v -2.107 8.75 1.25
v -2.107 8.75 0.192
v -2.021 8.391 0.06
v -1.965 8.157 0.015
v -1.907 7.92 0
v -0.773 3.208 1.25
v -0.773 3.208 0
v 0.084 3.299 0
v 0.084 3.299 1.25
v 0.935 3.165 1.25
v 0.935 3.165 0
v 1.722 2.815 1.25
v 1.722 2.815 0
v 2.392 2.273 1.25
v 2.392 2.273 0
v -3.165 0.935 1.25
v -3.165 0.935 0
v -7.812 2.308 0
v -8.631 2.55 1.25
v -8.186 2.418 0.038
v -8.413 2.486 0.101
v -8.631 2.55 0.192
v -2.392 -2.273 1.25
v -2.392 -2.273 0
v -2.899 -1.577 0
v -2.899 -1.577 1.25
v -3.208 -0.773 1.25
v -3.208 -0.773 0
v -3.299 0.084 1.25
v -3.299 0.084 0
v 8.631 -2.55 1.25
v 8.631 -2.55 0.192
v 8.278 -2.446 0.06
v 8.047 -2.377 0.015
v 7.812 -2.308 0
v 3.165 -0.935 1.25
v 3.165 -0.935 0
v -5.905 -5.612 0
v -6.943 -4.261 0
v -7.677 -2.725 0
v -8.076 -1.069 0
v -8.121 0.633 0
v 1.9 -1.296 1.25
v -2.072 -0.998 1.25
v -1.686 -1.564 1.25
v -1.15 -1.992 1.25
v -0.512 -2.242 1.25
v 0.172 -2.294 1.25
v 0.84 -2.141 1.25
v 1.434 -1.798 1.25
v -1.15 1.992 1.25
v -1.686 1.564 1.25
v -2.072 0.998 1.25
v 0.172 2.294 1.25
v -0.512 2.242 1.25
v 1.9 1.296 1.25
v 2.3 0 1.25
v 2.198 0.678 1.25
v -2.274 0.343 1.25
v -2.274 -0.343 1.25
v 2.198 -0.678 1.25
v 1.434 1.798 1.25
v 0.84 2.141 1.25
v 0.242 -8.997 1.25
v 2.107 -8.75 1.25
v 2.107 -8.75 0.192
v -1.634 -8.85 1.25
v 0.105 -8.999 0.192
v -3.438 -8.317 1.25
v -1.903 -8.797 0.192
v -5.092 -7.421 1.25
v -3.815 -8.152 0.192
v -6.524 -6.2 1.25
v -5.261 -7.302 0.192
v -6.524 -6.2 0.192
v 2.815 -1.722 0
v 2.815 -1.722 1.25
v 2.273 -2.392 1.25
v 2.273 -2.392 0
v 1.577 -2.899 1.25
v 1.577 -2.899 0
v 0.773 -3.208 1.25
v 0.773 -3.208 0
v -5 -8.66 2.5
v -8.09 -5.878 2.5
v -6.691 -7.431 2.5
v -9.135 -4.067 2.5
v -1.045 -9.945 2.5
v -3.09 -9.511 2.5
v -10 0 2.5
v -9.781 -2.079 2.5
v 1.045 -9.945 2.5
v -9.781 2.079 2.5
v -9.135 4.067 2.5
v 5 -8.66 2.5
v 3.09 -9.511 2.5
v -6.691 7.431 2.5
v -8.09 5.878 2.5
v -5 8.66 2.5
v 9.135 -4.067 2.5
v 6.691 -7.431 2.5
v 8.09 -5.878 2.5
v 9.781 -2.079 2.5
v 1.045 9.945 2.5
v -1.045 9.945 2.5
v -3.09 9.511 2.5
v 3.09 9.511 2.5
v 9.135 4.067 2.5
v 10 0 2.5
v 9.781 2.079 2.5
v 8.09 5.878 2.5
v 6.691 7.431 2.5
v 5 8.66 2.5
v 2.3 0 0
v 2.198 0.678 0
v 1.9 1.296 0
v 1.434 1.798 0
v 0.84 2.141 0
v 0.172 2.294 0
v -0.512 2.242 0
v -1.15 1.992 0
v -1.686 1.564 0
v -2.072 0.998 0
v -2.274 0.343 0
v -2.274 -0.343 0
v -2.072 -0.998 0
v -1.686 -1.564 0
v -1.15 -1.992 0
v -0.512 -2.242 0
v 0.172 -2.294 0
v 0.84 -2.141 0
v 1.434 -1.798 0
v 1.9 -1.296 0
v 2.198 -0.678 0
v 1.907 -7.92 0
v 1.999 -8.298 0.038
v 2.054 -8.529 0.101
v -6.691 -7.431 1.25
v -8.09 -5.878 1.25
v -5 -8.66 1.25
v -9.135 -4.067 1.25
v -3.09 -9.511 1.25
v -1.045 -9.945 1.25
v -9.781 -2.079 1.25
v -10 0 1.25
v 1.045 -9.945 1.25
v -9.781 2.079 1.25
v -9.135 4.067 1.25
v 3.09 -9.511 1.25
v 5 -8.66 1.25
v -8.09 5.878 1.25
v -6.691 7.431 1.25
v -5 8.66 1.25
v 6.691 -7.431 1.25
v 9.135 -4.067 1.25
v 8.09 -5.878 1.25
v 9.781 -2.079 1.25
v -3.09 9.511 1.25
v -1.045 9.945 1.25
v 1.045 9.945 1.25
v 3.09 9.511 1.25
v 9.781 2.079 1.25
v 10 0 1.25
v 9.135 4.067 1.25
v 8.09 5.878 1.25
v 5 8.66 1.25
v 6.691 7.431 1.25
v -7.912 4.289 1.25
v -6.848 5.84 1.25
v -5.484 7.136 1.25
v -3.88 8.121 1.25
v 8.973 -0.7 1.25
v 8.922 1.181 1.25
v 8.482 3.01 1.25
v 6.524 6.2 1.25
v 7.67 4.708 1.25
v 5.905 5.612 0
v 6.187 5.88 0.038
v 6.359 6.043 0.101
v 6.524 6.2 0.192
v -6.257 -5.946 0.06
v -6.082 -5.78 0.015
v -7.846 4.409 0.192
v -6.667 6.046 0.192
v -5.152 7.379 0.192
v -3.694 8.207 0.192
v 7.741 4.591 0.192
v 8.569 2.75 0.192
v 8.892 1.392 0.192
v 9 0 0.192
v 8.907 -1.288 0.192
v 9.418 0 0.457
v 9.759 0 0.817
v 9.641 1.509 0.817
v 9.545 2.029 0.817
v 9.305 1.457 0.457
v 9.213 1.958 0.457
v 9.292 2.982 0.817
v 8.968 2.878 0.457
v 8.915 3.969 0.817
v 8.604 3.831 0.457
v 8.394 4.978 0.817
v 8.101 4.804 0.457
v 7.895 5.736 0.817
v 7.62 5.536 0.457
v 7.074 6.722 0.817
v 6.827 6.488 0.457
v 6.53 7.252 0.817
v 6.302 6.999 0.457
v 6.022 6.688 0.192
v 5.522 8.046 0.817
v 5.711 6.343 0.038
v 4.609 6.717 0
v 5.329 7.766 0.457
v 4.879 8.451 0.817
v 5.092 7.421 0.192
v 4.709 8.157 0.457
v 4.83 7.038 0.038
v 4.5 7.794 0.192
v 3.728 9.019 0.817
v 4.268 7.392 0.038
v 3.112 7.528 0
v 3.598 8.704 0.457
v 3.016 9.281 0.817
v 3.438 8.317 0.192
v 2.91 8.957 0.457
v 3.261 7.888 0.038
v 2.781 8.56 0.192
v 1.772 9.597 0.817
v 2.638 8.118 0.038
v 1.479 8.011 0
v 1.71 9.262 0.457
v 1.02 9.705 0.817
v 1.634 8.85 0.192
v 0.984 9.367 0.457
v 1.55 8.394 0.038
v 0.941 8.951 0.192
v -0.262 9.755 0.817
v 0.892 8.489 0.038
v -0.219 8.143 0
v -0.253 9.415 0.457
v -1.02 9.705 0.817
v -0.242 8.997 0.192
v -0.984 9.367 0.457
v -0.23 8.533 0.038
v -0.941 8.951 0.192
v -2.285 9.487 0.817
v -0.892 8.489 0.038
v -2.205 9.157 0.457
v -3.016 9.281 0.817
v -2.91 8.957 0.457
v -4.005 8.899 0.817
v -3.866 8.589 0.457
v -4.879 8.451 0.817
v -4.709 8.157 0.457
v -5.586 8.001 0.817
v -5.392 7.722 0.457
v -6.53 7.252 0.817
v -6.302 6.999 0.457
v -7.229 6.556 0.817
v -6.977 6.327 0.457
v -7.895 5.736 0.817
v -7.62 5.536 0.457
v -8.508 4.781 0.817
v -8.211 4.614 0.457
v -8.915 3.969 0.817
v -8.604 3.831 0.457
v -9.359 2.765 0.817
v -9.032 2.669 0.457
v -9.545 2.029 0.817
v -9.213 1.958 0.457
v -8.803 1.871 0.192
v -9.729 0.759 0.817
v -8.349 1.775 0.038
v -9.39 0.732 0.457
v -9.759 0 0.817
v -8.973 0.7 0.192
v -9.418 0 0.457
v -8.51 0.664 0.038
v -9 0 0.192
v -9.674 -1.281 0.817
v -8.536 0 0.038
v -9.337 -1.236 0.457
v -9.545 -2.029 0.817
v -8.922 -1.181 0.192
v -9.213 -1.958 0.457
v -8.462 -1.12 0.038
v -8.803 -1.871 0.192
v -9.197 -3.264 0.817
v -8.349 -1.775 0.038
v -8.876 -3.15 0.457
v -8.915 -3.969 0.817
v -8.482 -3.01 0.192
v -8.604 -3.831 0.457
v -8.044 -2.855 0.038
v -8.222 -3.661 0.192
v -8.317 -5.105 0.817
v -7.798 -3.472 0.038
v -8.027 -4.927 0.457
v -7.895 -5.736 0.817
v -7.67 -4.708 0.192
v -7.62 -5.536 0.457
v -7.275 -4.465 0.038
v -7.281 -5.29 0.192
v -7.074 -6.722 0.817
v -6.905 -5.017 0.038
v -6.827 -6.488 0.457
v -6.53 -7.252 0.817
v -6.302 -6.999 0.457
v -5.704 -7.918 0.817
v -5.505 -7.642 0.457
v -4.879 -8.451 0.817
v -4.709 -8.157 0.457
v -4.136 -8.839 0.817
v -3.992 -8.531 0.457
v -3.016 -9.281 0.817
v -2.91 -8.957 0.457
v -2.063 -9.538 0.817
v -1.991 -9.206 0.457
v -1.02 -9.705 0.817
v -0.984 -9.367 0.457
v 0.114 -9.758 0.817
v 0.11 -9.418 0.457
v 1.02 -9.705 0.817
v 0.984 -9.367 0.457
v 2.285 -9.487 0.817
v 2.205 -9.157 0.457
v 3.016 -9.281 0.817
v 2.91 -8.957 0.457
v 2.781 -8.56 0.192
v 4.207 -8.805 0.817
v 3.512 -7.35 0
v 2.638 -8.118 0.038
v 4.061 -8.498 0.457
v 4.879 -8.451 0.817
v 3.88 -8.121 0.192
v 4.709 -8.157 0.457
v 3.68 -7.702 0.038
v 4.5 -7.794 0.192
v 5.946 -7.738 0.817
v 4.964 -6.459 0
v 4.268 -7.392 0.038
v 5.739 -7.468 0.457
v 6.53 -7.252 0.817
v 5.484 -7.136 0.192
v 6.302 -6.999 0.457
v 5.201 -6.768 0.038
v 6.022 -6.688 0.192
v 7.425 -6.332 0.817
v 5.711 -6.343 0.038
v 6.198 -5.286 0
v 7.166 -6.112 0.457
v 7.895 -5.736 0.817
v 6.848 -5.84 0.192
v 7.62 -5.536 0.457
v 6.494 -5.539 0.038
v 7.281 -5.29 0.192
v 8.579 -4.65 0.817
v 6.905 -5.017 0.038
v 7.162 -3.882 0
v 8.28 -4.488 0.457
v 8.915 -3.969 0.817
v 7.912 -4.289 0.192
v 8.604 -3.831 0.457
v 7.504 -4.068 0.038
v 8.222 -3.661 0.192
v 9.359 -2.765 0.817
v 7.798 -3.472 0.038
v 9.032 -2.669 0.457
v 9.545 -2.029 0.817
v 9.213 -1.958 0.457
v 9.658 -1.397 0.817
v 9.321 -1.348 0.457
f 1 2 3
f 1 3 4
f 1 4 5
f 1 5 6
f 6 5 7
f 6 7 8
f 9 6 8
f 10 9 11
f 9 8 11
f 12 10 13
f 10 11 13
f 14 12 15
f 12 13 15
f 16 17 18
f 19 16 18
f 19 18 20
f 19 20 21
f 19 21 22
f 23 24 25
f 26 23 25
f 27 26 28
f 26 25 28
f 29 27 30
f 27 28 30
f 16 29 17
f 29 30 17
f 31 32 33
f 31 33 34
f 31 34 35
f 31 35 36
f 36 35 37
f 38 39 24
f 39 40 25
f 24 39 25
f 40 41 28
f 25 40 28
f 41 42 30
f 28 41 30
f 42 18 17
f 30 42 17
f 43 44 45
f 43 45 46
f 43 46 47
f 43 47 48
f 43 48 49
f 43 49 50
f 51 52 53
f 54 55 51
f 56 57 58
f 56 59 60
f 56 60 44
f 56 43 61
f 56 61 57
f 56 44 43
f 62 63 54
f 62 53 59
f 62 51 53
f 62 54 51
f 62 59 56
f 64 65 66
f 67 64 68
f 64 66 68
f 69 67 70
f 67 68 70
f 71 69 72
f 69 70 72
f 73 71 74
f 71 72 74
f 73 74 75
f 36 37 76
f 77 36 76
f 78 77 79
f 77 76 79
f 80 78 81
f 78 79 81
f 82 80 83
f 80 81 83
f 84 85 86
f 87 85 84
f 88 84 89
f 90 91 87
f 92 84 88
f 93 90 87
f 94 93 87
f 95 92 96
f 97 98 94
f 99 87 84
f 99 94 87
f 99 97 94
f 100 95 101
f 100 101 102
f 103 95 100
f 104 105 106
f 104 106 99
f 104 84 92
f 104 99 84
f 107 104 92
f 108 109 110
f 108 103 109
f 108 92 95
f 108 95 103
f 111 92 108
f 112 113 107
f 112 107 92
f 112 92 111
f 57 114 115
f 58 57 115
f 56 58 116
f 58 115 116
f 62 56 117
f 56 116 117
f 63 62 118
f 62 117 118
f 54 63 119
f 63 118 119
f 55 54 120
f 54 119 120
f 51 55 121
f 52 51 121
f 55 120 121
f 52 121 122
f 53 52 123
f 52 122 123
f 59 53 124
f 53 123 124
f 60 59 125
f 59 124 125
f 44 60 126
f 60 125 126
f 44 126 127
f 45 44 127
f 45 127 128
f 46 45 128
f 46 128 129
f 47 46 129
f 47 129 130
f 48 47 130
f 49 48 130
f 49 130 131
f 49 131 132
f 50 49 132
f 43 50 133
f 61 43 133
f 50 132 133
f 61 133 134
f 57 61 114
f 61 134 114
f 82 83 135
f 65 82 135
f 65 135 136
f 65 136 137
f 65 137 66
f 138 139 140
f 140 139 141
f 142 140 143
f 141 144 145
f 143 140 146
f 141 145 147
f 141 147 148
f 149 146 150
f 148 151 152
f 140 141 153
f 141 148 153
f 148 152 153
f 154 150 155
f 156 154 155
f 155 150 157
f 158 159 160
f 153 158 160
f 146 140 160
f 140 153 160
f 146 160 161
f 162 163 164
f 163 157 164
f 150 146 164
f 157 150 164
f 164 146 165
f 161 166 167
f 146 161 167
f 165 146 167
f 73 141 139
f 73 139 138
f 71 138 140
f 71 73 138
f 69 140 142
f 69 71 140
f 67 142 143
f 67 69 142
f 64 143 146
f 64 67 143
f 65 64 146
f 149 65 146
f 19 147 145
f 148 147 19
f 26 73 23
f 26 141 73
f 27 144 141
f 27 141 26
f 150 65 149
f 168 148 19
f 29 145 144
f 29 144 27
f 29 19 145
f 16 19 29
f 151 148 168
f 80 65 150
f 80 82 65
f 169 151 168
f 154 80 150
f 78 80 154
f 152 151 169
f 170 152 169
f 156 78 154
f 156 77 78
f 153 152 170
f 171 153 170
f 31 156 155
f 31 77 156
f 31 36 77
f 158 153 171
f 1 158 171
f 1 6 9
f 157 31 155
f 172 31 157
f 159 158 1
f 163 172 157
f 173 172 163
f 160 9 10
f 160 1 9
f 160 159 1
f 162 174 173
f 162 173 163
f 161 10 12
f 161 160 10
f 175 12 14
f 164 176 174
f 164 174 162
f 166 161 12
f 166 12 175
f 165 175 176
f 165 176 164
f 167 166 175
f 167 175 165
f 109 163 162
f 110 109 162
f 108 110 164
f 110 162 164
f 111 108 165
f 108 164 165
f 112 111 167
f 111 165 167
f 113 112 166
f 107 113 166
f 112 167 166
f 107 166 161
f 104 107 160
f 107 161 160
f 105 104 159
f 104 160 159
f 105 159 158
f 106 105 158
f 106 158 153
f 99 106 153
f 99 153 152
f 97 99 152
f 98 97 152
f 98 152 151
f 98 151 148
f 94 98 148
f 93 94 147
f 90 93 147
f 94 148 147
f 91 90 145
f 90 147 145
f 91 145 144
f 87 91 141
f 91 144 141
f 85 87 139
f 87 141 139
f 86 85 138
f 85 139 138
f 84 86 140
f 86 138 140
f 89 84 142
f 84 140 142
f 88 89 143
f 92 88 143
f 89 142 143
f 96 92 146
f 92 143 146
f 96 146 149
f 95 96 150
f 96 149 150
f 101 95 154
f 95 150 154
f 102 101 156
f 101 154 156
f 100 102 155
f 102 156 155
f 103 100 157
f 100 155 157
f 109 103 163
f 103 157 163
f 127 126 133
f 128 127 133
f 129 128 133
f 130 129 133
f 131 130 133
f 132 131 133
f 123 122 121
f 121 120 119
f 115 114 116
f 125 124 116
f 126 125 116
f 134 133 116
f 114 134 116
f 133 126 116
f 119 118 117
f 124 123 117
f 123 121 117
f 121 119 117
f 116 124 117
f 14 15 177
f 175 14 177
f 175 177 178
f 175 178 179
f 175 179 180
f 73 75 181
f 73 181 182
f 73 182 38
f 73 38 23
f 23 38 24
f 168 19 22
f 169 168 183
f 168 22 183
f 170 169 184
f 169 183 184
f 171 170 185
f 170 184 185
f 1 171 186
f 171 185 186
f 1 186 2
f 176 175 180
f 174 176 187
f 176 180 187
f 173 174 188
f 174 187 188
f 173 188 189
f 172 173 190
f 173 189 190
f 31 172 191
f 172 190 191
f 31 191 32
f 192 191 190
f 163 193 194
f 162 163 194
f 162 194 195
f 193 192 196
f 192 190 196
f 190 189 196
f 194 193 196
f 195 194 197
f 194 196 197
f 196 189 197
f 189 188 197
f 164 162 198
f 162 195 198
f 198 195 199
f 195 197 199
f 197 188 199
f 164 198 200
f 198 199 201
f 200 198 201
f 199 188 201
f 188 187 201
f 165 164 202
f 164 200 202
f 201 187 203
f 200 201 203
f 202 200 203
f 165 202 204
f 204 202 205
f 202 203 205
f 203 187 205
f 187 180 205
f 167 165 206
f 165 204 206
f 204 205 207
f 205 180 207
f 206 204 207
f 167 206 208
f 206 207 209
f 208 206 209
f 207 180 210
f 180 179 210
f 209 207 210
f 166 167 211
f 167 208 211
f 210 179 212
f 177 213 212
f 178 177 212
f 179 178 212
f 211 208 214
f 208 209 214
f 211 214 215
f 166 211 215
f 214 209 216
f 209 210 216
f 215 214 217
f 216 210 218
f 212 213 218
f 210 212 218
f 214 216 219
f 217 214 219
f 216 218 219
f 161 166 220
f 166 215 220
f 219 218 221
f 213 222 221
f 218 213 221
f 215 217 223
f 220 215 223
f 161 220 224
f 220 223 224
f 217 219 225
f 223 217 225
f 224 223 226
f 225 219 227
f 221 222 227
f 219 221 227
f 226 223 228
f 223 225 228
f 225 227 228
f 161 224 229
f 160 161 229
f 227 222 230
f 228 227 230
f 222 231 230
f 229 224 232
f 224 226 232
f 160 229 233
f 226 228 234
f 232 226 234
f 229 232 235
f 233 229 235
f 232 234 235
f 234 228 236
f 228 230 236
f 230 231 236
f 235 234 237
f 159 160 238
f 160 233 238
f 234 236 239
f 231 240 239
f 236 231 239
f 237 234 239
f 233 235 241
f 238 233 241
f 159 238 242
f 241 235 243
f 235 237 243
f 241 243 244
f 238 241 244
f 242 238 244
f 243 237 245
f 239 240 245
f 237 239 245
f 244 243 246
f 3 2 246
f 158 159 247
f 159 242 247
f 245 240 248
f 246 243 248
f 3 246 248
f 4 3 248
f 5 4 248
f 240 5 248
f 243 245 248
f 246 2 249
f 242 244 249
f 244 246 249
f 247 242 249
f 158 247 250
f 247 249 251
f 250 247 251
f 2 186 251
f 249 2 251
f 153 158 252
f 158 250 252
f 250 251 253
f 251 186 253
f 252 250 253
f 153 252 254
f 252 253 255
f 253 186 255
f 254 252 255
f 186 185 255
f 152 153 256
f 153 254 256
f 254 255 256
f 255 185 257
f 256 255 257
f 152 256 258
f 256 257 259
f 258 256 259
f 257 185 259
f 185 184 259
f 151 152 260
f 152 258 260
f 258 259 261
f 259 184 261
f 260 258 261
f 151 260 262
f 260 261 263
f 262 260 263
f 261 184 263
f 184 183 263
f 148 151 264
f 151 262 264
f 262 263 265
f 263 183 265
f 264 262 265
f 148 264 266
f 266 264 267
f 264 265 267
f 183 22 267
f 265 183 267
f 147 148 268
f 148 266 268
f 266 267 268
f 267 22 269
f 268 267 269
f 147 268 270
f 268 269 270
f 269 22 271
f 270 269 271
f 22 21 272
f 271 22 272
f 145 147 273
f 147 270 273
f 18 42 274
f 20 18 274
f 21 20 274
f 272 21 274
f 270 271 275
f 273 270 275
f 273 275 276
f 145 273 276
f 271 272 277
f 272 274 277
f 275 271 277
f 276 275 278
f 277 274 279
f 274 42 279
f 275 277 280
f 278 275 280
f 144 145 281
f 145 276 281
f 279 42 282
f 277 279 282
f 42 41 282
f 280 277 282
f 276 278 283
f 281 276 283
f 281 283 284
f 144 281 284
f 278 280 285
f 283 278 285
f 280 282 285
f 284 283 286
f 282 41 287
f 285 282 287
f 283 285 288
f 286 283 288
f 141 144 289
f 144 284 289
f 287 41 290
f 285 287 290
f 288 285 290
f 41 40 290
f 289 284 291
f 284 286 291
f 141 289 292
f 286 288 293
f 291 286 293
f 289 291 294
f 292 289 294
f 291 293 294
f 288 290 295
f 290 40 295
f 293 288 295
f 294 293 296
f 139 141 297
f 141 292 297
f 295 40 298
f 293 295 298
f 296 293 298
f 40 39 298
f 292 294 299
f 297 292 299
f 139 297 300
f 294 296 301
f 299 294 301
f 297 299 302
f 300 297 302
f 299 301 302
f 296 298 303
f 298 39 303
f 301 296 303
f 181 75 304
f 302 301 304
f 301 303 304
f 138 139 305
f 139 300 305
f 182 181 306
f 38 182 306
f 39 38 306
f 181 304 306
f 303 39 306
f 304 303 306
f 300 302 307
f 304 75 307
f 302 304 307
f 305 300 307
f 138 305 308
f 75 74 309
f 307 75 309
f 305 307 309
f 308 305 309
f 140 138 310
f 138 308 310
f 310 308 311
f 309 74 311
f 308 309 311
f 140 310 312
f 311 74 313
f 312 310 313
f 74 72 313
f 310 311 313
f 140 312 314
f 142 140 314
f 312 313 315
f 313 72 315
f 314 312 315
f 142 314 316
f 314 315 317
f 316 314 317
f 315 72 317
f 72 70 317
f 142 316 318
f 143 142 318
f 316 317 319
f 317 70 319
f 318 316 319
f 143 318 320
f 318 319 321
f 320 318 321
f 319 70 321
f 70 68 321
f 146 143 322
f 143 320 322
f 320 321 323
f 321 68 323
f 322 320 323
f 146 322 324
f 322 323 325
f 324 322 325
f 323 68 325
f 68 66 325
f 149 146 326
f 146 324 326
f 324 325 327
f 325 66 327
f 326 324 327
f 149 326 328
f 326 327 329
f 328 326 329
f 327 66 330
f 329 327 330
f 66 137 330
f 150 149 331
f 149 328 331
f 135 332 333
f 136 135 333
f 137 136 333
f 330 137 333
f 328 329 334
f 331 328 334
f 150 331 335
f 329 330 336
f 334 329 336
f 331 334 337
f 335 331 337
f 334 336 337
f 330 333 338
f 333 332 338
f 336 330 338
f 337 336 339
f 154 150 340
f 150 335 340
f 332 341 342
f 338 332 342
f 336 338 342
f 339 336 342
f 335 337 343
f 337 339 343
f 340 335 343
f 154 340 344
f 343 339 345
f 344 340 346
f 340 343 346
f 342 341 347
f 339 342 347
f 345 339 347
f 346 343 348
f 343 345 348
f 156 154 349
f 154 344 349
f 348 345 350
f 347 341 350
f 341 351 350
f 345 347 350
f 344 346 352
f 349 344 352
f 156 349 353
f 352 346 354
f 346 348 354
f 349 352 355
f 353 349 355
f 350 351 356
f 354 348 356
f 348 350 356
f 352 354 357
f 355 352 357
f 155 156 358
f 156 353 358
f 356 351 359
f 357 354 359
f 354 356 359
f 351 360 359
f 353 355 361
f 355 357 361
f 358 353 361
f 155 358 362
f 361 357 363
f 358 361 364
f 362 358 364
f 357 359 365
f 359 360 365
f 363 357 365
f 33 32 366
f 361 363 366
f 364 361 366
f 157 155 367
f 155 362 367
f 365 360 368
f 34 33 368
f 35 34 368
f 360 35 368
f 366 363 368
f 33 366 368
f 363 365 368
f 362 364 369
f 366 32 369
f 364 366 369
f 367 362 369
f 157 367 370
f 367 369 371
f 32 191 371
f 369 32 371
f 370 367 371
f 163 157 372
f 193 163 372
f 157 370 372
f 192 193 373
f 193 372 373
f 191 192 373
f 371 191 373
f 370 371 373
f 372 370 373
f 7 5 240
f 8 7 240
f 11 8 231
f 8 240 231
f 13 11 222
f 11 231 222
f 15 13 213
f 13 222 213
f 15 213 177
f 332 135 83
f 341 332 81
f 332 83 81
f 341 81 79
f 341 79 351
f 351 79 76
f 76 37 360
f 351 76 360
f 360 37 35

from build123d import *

# Parameters (mm, degrees)
F0_R     = 2.3
F1_DEPTH = 1.25
F0_R_2   = 10
F3_START = 1.25
F3_DEPTH = 1.25


# Not quite as in the source:
# - a fillet or chamfer that OpenCascade refuses, or shapes differently, is made with other operations: its cross-section is extruded or revolved along the edge and cut away or added


with BuildPart() as f1:
    # F0 (on Top) → F1 (new body)
    with BuildSketch(Plane.XY):
        Circle(F0_R)
    extrude(amount=F1_DEPTH)


with BuildPart() as f1b:
    # F0 (on Top) → F1, piece 2 (new body)
    with BuildSketch(Plane.XY):
        Circle(F0_R_2)
        with BuildLine():
            ThreePointArc((2.1072346154, -8.7498321284), (-2.5499973556, -8.6311942098), (-6.5239595944, -6.1998347729))
            Line((-6.5239595944, -6.1998347729), (-2.3921185179, -2.27327275))
            ThreePointArc((-2.3921185179, -2.27327275), (-3.2082717804, -0.7726526923), (-3.1647712102, 0.9349990304))
            Line((-3.1647712102, 0.9349990304), (-8.6311942098, 2.5499973556))
            ThreePointArc((-8.6311942098, 2.5499973556), (-6.1998347729, 6.5239595944), (-2.1072346154, 8.7498321284))
            Line((-2.1072346154, 8.7498321284), (-0.7726526923, 3.2082717804))
            ThreePointArc((-0.7726526923, 3.2082717804), (0.9349990304, 3.1647712102), (2.3921185179, 2.27327275))
            Line((2.3921185179, 2.27327275), (6.5239595944, 6.1998347729))
            ThreePointArc((6.5239595944, 6.1998347729), (8.7498321284, 2.1072346154), (8.6311942098, -2.5499973556))
            Line((8.6311942098, -2.5499973556), (3.1647712102, -0.9349990304))
            ThreePointArc((3.1647712102, -0.9349990304), (2.27327275, -2.3921185179), (0.7726526923, -3.2082717804))
            Line((0.7726526923, -3.2082717804), (2.1072346154, -8.7498321284))
        make_face(mode=Mode.SUBTRACT)
    extrude(amount=F1_DEPTH)

    # F2: fillet of radius 2 on 1 edges, made by hand

    # F2_s1 → F2_t2 (revolve, cut)
    with BuildSketch(Plane.XZ):
        with BuildLine():
            ThreePointArc((10, 1.25), (9.263984367, 0.3416876048), (8.1459503782, 0))
            Line((8.1459503782, 0), (10, 0))
            Line((10, 0), (10, 1.25))
        make_face()
    revolve(axis=Axis((0, 0, 0), (0, 0, 1)), mode=Mode.SUBTRACT)


with BuildPart() as f3:
    # F0 (on Top) → F3 (new body)
    with BuildSketch(Plane.XY.offset(F3_START)):
        Circle(F0_R_2)
        with BuildLine():
            ThreePointArc((2.1072346154, -8.7498321284), (-2.5499973556, -8.6311942098), (-6.5239595944, -6.1998347729))
            Line((-6.5239595944, -6.1998347729), (-2.3921185179, -2.27327275))
            ThreePointArc((-2.3921185179, -2.27327275), (-3.2082717804, -0.7726526923), (-3.1647712102, 0.9349990304))
            Line((-3.1647712102, 0.9349990304), (-8.6311942098, 2.5499973556))
            ThreePointArc((-8.6311942098, 2.5499973556), (-6.1998347729, 6.5239595944), (-2.1072346154, 8.7498321284))
            Line((-2.1072346154, 8.7498321284), (-0.7726526923, 3.2082717804))
            ThreePointArc((-0.7726526923, 3.2082717804), (0.9349990304, 3.1647712102), (2.3921185179, 2.27327275))
            Line((2.3921185179, 2.27327275), (6.5239595944, 6.1998347729))
            ThreePointArc((6.5239595944, 6.1998347729), (8.7498321284, 2.1072346154), (8.6311942098, -2.5499973556))
            Line((8.6311942098, -2.5499973556), (3.1647712102, -0.9349990304))
            ThreePointArc((3.1647712102, -0.9349990304), (2.27327275, -2.3921185179), (0.7726526923, -3.2082717804))
            Line((0.7726526923, -3.2082717804), (2.1072346154, -8.7498321284))
        make_face(mode=Mode.SUBTRACT)
        with BuildLine():
            Line((-2.3921185179, -2.27327275), (-6.5239595944, -6.1998347729))
            ThreePointArc((-6.5239595944, -6.1998347729), (-2.5499973556, -8.6311942098), (2.1072346154, -8.7498321284))
            Line((2.1072346154, -8.7498321284), (0.7726526923, -3.2082717804))
            ThreePointArc((0.7726526923, -3.2082717804), (2.27327275, -2.3921185179), (3.1647712102, -0.9349990304))
            Line((3.1647712102, -0.9349990304), (8.6311942098, -2.5499973556))
            ThreePointArc((8.6311942098, -2.5499973556), (8.7498321284, 2.1072346154), (6.5239595944, 6.1998347729))
            Line((6.5239595944, 6.1998347729), (2.3921185179, 2.27327275))
            ThreePointArc((2.3921185179, 2.27327275), (0.9349990304, 3.1647712102), (-0.7726526923, 3.2082717804))
            Line((-0.7726526923, 3.2082717804), (-2.1072346154, 8.7498321284))
            ThreePointArc((-2.1072346154, 8.7498321284), (-6.1998347729, 6.5239595944), (-8.6311942098, 2.5499973556))
            Line((-8.6311942098, 2.5499973556), (-3.1647712102, 0.9349990304))
            ThreePointArc((-3.1647712102, 0.9349990304), (-3.2082717804, -0.7726526923), (-2.3921185179, -2.27327275))
        make_face()
        Circle(F0_R, mode=Mode.SUBTRACT)
        Circle(F0_R)
    extrude(amount=F3_DEPTH)


solid = Compound([f1.part, f1b.part, f3.part])
